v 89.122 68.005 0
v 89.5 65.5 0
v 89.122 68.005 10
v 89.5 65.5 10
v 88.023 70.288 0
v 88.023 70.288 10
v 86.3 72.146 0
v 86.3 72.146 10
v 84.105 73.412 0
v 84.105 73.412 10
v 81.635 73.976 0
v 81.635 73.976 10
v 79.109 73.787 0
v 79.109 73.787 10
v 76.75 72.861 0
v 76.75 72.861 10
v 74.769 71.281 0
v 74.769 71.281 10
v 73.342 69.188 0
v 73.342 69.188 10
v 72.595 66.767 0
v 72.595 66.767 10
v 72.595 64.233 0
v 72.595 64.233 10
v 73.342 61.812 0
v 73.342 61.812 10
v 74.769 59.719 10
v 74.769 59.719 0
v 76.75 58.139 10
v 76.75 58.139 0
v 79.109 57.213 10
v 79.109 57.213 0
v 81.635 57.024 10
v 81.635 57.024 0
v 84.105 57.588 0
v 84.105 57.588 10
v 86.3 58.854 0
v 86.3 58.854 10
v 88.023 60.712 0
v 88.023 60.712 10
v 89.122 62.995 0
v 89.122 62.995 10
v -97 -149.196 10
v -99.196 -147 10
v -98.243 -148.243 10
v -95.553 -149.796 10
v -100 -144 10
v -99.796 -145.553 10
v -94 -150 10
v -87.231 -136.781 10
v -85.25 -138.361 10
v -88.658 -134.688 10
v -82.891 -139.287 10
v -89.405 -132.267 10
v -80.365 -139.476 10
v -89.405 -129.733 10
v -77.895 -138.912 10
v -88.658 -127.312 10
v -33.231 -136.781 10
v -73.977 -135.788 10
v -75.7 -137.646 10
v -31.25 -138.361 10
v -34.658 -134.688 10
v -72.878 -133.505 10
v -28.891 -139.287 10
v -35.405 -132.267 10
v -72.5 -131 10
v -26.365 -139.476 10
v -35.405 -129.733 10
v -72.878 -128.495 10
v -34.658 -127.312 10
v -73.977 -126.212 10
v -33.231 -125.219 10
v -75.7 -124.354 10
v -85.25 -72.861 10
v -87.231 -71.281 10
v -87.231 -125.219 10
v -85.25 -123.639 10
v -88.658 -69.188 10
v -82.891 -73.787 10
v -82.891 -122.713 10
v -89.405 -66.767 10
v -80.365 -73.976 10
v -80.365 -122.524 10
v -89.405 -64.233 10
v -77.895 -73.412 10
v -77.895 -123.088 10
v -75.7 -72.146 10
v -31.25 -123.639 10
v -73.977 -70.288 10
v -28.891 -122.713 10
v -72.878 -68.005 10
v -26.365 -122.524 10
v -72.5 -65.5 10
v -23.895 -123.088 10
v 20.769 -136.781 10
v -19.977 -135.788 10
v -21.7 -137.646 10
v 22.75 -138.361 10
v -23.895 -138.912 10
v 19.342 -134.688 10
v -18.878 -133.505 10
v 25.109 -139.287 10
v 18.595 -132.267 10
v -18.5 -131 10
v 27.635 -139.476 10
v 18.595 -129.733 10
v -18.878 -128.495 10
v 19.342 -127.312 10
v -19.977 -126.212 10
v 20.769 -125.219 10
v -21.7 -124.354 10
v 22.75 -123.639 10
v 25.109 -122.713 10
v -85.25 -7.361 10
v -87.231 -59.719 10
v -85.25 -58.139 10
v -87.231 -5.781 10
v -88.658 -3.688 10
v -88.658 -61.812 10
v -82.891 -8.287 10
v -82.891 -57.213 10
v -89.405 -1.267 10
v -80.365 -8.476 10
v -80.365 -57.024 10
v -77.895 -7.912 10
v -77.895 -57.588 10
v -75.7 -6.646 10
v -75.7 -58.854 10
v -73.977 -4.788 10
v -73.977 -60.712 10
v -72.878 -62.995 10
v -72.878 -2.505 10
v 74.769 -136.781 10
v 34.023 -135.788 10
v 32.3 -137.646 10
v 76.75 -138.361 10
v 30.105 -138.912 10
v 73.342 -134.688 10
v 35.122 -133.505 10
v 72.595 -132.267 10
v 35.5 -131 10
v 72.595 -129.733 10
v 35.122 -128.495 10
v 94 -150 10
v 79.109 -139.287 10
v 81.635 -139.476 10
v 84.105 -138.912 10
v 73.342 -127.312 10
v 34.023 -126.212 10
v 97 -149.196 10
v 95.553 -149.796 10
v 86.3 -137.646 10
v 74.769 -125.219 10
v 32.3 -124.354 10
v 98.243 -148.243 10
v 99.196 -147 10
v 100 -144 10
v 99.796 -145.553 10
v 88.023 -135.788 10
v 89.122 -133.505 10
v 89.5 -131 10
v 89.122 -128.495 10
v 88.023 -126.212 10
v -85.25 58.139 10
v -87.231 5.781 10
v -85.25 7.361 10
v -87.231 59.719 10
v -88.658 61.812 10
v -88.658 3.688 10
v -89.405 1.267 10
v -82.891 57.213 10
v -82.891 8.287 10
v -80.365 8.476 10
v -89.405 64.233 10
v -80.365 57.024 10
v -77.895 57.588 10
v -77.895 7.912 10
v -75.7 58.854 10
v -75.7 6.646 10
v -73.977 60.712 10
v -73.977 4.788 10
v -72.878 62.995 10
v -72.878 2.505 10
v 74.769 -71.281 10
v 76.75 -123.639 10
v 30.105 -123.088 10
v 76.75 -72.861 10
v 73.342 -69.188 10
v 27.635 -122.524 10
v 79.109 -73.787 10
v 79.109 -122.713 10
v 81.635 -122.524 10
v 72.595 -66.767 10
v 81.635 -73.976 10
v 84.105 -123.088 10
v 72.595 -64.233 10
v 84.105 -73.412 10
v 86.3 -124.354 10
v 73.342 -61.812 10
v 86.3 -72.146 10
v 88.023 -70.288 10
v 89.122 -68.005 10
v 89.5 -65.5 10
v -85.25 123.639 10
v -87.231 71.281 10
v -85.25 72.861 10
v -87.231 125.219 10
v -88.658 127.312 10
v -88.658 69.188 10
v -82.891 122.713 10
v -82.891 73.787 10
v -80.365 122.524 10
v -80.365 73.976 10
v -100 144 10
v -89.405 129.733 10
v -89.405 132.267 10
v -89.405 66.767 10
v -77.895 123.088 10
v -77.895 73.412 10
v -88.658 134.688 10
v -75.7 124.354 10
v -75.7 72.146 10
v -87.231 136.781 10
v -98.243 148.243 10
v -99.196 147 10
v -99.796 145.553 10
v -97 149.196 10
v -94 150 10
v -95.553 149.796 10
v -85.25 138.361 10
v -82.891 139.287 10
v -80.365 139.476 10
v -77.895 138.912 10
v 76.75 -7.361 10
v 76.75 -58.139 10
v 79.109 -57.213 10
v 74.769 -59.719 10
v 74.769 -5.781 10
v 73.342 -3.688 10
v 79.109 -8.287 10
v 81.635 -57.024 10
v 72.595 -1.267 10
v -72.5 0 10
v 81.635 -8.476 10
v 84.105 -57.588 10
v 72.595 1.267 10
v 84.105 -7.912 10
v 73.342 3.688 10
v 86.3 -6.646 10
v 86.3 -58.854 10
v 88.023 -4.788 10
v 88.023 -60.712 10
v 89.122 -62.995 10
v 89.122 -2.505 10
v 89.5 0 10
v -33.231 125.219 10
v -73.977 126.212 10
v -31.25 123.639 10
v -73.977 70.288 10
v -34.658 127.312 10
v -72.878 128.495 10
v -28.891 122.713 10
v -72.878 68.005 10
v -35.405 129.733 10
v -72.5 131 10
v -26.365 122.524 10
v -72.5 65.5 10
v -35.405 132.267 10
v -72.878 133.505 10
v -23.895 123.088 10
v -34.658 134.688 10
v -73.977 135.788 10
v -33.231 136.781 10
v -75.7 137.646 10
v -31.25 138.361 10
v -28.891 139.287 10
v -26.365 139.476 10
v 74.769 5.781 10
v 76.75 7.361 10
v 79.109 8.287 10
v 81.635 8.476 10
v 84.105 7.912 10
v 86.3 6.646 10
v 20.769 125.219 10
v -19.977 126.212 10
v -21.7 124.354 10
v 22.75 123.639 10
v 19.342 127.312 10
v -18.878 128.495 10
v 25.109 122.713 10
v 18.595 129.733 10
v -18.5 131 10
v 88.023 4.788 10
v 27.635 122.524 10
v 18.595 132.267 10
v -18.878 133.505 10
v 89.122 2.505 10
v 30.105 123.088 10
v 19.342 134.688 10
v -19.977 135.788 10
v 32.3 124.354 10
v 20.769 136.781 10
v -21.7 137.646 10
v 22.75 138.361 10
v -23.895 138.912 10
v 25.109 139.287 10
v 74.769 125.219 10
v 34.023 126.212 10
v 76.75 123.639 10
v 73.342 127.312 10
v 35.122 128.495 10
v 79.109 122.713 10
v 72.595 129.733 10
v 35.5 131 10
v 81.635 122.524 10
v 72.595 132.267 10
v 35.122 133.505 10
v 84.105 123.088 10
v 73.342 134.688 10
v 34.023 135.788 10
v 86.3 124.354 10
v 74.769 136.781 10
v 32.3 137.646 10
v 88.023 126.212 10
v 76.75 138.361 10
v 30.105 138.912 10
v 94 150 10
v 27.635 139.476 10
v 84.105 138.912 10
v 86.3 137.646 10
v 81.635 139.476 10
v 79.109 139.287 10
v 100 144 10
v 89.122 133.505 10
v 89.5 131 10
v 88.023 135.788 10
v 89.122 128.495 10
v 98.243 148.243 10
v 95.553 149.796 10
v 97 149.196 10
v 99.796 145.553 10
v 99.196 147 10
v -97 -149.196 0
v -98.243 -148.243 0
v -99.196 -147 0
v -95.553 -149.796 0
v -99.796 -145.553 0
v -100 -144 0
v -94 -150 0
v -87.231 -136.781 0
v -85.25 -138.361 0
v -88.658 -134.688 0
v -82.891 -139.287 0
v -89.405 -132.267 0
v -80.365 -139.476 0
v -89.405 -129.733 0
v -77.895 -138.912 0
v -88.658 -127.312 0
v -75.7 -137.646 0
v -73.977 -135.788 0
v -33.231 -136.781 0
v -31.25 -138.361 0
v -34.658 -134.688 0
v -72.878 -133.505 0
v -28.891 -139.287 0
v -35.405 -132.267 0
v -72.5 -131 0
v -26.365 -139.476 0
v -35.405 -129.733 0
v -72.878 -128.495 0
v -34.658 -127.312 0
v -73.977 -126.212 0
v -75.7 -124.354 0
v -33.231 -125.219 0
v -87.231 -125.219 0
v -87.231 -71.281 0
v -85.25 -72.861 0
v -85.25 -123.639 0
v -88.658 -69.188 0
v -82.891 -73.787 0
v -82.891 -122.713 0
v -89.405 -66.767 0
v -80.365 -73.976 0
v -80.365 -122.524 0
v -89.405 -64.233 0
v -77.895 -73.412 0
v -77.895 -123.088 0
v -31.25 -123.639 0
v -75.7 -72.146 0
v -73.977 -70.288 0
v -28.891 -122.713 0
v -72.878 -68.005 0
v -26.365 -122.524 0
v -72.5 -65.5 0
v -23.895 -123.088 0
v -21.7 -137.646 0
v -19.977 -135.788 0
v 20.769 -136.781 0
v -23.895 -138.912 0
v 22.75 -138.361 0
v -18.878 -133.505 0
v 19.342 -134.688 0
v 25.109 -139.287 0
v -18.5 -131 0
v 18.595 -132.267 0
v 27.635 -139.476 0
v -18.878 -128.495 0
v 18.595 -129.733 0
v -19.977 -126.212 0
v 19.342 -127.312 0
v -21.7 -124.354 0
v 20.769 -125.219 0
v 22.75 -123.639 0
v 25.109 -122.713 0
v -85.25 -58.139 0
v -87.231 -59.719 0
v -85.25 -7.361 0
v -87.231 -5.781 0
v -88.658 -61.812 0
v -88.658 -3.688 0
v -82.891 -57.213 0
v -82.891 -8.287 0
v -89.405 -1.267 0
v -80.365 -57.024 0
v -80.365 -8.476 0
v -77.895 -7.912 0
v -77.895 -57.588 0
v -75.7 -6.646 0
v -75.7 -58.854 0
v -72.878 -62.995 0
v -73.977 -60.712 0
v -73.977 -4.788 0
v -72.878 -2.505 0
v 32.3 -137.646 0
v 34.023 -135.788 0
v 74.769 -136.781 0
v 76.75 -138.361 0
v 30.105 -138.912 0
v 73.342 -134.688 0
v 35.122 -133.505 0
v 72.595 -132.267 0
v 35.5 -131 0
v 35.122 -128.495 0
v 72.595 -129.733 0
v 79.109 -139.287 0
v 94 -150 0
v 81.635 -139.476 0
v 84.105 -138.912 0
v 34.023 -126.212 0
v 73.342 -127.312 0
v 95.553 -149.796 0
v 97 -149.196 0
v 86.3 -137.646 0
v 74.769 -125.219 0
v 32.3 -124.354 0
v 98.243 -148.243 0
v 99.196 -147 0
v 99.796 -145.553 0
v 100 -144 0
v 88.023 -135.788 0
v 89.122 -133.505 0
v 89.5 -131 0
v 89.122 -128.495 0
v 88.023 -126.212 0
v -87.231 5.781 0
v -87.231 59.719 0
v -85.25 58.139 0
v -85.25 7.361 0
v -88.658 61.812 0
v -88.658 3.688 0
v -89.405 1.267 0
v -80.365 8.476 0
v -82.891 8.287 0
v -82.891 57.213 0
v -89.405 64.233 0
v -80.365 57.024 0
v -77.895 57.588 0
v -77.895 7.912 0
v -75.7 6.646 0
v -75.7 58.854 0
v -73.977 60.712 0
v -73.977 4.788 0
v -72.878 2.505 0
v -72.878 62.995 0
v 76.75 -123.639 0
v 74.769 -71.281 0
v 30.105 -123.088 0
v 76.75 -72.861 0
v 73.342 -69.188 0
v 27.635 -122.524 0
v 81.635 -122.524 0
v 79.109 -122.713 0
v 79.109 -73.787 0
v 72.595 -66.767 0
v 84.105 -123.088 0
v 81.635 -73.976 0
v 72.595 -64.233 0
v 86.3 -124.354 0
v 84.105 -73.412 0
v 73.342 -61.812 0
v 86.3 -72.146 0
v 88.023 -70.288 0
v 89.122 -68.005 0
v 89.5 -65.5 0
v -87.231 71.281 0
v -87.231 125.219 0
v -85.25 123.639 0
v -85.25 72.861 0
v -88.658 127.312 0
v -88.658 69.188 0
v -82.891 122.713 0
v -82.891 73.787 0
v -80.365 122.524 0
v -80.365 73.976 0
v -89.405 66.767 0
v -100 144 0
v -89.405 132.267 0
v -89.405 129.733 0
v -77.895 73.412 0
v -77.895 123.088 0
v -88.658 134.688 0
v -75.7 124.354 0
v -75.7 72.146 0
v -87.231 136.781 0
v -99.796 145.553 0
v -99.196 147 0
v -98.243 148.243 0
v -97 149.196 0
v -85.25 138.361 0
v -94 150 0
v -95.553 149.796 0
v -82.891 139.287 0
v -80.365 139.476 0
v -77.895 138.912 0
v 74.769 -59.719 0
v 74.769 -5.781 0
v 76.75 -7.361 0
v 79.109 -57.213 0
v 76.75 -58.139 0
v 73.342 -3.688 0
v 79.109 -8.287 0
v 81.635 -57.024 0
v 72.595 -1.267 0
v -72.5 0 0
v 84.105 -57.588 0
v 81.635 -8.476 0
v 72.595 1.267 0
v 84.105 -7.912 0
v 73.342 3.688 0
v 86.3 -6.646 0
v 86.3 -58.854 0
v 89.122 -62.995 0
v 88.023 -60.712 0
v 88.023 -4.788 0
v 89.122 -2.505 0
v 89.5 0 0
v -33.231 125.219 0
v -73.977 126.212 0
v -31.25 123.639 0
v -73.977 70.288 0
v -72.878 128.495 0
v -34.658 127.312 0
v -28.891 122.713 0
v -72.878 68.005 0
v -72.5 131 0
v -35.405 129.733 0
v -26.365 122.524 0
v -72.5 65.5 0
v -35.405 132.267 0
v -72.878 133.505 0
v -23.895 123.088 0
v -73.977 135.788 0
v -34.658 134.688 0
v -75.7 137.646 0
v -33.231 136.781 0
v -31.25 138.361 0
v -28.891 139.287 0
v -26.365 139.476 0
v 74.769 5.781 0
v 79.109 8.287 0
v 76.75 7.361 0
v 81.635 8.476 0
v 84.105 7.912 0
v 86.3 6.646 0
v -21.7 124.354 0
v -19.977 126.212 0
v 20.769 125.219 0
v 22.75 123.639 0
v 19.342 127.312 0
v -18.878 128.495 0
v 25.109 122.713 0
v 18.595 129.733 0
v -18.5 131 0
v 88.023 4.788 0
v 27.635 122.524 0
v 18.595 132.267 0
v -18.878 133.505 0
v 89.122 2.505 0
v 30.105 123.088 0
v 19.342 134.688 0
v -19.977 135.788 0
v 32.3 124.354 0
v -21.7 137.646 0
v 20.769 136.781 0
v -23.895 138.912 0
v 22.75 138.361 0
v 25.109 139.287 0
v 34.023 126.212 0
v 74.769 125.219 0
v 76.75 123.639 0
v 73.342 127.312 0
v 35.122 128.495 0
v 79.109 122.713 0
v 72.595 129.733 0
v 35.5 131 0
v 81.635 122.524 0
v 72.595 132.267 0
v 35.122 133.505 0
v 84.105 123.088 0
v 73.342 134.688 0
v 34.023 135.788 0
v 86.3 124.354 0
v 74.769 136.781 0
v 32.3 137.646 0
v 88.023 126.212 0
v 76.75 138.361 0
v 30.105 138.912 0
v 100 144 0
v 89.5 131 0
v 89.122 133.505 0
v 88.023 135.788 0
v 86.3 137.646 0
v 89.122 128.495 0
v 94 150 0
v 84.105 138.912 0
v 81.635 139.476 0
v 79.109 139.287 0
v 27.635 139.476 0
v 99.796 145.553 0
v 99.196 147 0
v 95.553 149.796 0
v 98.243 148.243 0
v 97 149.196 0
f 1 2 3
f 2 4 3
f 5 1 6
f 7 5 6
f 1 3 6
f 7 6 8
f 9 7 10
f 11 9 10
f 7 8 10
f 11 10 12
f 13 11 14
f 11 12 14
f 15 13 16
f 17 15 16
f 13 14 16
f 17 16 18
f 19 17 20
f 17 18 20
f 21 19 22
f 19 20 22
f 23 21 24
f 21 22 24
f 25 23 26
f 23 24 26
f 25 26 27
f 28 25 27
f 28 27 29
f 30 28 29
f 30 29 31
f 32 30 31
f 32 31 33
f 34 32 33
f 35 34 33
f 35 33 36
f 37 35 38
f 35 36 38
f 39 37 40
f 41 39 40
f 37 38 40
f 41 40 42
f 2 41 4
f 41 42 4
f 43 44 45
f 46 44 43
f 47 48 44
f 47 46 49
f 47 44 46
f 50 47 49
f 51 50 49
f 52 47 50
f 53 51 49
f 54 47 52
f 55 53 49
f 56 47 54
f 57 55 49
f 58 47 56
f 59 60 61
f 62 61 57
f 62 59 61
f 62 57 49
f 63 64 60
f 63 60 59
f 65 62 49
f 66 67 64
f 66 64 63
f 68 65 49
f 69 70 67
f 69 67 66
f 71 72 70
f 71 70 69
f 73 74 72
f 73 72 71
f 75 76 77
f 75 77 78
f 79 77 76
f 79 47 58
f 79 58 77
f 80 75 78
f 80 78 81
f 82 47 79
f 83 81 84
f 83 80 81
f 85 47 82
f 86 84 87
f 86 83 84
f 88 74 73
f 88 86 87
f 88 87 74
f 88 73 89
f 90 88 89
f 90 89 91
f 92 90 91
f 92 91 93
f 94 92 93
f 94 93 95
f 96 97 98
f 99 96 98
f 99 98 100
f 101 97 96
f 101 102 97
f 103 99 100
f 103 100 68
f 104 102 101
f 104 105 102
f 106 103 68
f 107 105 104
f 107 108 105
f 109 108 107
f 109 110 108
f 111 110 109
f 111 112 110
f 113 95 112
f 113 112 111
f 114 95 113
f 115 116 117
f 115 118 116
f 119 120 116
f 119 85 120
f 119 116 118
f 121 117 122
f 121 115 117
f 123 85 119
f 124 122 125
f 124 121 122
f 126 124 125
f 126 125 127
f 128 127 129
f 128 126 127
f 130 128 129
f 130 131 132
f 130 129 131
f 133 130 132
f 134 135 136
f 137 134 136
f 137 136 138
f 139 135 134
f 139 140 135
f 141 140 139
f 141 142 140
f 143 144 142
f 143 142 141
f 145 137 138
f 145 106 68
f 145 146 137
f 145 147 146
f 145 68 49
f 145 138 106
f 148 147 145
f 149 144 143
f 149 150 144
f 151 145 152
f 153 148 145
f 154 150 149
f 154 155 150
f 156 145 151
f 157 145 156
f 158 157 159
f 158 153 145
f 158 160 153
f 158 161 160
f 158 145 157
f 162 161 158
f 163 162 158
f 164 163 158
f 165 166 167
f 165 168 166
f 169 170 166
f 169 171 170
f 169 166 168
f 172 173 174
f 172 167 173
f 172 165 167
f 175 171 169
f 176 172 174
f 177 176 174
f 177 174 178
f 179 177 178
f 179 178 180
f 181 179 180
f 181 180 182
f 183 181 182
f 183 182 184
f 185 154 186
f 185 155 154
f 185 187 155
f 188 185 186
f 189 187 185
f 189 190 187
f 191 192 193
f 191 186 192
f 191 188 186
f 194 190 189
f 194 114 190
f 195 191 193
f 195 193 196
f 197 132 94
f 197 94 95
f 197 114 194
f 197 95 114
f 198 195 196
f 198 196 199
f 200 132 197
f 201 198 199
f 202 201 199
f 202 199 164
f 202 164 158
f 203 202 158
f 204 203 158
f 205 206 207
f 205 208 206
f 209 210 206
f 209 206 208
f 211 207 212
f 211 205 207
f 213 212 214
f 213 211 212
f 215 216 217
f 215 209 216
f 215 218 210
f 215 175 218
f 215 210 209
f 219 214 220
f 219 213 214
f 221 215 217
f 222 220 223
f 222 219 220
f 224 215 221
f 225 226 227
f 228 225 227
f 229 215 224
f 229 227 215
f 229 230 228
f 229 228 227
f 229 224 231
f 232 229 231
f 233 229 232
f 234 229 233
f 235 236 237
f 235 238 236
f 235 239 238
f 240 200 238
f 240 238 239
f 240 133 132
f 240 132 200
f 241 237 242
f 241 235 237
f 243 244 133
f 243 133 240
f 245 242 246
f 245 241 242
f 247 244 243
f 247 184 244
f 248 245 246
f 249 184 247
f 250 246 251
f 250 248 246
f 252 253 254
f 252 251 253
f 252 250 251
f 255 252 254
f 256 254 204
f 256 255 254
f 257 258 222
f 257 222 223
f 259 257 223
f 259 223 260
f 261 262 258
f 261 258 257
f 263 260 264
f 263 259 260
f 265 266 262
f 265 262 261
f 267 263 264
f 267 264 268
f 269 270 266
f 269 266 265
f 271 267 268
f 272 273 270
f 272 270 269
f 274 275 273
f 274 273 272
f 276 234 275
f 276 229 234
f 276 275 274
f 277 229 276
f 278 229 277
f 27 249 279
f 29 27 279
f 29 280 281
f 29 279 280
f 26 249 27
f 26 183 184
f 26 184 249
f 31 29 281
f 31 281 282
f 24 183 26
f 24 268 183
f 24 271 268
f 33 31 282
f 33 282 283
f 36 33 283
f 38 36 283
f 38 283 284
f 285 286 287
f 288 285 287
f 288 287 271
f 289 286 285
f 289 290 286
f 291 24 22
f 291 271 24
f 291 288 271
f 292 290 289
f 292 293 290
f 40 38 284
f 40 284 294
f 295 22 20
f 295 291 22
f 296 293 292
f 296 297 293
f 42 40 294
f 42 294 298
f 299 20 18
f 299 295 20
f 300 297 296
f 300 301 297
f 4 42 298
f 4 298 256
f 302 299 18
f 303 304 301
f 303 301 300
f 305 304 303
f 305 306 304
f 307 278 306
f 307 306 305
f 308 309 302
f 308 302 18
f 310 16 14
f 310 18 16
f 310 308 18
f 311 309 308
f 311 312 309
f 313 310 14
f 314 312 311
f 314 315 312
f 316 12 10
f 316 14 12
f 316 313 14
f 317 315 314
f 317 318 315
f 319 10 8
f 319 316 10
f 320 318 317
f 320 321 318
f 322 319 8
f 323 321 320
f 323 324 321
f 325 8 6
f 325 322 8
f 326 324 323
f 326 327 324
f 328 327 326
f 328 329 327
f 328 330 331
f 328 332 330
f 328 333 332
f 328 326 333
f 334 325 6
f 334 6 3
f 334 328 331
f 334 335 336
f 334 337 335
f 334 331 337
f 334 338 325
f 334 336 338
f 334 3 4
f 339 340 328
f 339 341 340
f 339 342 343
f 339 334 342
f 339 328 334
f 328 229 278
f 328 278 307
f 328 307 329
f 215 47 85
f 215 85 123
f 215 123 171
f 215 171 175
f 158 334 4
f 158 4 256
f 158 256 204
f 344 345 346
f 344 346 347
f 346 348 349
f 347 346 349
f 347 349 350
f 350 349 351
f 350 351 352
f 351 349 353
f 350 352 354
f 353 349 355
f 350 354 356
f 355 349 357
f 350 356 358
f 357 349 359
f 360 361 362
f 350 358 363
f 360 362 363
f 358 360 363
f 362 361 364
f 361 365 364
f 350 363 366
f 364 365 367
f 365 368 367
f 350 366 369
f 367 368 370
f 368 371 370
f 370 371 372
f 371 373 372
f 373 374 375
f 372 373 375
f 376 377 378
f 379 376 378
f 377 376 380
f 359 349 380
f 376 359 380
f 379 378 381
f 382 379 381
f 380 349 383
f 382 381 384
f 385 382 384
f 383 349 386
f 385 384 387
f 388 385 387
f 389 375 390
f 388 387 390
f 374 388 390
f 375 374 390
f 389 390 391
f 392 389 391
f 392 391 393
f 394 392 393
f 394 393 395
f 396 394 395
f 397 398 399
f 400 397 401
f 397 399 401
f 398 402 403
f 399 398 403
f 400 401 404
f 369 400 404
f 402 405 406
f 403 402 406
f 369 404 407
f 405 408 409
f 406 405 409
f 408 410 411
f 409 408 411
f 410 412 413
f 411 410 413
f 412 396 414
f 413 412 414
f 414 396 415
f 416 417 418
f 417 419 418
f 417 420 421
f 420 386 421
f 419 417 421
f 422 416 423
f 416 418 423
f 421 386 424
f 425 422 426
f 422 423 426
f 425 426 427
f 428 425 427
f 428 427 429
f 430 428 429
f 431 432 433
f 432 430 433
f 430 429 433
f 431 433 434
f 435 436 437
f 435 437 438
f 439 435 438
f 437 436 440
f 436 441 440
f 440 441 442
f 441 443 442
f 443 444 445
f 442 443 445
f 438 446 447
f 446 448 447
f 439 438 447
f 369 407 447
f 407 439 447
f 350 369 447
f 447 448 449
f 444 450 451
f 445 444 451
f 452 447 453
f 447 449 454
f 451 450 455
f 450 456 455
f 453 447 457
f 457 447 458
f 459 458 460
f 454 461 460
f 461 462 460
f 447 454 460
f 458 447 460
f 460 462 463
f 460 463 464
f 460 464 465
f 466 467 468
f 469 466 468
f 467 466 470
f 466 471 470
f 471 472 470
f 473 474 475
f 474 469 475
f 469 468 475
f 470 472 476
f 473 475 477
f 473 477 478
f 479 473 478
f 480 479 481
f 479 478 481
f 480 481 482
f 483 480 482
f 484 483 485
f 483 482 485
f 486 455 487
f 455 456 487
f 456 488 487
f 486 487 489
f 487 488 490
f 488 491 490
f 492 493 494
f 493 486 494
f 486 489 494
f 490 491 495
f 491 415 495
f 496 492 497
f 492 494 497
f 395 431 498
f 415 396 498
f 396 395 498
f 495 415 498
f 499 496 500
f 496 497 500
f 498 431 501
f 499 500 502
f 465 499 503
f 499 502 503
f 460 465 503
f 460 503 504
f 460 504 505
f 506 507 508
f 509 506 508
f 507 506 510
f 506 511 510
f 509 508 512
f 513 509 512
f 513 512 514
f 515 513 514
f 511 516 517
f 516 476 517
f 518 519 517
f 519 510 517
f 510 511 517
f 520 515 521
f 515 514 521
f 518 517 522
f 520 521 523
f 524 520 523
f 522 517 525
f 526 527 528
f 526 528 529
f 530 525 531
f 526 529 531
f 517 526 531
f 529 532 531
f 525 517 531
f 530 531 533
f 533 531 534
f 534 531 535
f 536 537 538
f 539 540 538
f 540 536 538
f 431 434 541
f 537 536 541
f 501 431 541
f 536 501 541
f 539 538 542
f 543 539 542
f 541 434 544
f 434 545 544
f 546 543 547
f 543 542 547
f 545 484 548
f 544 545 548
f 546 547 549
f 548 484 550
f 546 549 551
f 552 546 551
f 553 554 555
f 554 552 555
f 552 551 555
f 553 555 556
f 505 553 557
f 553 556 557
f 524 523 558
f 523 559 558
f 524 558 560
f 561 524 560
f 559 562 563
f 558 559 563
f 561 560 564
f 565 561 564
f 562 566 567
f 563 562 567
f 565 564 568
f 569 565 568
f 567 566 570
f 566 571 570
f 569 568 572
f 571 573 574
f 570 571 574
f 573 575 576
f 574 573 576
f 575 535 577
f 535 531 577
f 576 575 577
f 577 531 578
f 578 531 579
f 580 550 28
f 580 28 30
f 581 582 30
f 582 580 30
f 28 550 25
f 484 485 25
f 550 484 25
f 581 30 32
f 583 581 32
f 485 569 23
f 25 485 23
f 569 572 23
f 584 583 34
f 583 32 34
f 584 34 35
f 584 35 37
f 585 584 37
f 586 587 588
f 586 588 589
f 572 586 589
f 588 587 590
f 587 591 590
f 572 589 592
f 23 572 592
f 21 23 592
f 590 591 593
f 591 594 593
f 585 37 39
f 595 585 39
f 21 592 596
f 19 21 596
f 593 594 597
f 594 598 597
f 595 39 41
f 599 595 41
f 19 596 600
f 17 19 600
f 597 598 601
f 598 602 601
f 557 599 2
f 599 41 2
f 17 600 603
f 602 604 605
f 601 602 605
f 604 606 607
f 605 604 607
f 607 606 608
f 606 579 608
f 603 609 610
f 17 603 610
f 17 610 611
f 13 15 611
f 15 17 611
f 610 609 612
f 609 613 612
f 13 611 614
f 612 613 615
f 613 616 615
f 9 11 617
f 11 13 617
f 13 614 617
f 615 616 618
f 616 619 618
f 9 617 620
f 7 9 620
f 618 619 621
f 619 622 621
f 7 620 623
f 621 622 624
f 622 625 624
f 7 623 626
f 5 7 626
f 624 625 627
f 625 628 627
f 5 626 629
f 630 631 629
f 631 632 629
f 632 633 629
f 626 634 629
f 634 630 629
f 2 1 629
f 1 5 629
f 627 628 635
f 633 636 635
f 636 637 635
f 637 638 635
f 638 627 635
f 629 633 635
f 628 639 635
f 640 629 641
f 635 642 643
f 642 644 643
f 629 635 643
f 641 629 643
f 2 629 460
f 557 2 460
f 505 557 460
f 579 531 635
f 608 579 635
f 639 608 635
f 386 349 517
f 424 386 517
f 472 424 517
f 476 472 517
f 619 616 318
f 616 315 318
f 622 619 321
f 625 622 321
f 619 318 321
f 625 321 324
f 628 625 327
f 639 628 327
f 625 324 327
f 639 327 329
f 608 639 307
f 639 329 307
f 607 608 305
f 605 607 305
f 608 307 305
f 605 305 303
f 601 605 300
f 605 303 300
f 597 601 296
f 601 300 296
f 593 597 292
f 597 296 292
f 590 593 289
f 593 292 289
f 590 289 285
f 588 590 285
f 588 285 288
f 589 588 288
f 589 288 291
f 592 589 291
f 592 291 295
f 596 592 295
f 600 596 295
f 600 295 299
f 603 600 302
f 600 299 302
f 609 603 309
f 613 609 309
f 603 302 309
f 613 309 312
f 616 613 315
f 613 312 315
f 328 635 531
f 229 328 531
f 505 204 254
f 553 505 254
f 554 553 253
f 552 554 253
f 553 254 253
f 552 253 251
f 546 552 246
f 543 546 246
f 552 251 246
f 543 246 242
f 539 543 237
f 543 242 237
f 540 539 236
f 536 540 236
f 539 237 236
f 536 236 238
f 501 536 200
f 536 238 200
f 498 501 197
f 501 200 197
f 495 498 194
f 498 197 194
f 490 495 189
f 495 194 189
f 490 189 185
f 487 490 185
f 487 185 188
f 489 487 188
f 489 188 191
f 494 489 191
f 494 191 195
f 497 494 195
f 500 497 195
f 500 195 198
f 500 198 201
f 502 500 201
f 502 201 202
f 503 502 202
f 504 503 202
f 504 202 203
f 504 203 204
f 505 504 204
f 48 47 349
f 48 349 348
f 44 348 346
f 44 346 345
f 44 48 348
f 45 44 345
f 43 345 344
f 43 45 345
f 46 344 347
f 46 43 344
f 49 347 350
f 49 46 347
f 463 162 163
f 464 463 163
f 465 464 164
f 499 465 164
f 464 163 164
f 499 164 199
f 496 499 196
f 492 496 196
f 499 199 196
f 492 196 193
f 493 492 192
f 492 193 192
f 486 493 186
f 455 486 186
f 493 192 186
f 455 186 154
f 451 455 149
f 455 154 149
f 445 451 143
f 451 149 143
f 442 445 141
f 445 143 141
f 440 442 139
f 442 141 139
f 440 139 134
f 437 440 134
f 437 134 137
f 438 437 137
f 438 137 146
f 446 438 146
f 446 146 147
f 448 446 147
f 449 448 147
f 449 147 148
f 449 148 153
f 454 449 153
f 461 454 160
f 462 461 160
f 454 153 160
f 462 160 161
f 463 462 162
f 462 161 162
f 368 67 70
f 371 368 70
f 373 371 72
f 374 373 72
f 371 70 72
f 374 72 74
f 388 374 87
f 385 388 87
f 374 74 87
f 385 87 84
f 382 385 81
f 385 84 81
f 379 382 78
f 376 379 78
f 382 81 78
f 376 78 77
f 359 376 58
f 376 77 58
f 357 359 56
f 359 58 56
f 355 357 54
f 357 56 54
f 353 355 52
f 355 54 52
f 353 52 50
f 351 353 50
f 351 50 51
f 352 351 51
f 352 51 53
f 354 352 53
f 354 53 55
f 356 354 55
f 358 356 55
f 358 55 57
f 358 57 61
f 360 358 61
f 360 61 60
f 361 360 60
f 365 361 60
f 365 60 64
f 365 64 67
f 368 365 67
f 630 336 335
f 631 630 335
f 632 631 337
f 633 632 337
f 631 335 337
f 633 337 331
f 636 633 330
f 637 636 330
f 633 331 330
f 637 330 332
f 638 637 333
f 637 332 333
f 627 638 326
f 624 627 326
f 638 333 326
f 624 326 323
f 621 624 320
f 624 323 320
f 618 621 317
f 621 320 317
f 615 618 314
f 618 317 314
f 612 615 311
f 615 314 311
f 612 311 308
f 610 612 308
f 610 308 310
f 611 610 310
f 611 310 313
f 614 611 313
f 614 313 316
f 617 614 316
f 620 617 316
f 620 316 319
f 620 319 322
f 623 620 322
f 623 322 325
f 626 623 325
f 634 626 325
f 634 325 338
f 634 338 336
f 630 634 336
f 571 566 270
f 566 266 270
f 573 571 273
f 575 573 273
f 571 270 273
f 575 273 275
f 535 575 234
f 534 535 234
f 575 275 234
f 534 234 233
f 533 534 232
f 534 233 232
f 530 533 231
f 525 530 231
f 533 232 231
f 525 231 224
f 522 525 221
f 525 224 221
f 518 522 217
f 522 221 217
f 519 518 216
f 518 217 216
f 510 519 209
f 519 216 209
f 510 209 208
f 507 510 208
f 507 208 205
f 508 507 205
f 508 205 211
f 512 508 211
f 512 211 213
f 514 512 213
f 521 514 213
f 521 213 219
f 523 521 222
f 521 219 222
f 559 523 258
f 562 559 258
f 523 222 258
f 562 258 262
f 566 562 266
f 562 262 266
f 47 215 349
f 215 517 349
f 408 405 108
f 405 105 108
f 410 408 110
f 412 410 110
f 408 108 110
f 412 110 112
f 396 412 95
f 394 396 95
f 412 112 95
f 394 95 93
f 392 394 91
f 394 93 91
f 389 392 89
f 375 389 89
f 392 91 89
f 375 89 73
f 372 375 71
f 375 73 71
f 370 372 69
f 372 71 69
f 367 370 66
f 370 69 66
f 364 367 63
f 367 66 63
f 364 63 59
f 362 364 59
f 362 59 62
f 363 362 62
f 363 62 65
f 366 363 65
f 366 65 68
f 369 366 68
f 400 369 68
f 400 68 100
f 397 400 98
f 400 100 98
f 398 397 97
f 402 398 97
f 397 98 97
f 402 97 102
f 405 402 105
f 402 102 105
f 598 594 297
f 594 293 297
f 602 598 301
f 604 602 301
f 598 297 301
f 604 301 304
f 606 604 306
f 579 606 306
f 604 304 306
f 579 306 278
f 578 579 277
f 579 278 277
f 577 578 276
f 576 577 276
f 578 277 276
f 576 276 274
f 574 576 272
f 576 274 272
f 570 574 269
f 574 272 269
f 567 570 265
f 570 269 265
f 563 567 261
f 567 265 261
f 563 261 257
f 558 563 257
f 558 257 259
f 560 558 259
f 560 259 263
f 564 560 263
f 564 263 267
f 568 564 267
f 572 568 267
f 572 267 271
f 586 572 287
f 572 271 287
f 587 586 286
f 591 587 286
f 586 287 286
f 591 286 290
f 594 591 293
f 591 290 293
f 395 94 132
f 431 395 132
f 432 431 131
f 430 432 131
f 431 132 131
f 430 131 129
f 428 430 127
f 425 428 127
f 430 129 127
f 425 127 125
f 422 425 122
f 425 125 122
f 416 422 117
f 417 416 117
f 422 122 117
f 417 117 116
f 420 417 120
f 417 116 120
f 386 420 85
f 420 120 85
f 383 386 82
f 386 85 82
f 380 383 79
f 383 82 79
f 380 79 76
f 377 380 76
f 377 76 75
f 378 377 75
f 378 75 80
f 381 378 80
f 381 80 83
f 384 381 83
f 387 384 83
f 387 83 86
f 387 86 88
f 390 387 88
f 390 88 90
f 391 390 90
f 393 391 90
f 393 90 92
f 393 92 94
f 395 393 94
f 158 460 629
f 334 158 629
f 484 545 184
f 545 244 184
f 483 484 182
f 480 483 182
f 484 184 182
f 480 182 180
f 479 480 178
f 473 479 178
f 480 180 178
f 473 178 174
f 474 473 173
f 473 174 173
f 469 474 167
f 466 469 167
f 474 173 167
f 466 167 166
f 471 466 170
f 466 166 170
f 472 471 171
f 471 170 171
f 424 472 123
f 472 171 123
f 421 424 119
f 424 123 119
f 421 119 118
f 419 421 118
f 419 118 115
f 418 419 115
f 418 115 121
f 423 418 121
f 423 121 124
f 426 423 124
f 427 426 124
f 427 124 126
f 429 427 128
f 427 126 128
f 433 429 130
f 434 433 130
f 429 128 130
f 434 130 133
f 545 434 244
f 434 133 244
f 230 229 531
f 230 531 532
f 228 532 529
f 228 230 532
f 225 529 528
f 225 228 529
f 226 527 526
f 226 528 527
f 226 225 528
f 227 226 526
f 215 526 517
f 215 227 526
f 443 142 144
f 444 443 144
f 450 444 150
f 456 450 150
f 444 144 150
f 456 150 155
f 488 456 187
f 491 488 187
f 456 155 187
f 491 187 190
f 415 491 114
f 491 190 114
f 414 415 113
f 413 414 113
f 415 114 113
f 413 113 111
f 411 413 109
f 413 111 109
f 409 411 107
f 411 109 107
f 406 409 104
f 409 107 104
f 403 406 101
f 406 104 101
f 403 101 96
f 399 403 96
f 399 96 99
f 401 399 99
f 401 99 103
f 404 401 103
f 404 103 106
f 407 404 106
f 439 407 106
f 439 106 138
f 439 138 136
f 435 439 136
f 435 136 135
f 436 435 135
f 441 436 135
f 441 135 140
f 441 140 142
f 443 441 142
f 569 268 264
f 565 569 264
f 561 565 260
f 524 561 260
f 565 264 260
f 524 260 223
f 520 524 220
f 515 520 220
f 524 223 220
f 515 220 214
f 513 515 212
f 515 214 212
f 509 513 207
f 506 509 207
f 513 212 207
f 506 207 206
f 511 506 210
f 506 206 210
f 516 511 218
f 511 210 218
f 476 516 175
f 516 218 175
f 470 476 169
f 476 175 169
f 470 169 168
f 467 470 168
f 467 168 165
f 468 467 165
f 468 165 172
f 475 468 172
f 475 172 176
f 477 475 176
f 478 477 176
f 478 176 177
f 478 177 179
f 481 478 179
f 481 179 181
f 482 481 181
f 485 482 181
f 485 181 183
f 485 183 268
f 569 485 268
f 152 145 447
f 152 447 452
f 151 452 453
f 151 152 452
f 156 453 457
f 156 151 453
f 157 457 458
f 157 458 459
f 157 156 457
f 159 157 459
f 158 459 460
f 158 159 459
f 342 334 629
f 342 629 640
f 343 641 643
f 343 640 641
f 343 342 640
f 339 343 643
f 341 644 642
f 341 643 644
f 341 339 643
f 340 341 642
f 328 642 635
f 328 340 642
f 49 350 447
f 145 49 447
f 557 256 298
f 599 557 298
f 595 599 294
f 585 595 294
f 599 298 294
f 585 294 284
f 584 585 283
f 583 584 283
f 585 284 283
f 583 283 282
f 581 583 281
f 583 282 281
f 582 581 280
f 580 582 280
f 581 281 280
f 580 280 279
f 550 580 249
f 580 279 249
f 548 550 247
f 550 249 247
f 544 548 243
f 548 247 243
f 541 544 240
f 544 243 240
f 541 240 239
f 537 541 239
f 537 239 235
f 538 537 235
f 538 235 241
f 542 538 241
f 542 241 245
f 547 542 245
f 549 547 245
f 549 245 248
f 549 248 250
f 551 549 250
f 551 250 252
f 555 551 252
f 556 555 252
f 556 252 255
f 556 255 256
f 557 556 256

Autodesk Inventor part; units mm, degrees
ref_plane "YZ Plane" through (0, 0, 0) normal (1, 0, 0) x (0, 1, 0)
ref_plane "XZ Plane" through (0, 0, 0) normal (0, 1, 0) x (-1, 0, 0)
ref_plane "XY Plane" through (0, 0, 0) normal (0, 0, 1) x (1, 0, 0)
sketch "Sketch2" plane through (0, 0, 0) normal (0, 0, 1) x (1, 0, 0)
  line L0 (-50, -100) -> (50, -100)
  line L1 (50, -100) -> (50, 100)
  line L2 (50, 100) -> (-50, 100)
  line L3 (-50, 100) -> (-50, -100)
  line L4 (-50, -100) -> (50, 100) construction
  line L5 (50, -100) -> (-50, 100) construction
  line L6 (-100, -150) -> (100, -150)
  line L7 (100, -150) -> (100, 150)
  line L8 (100, 150) -> (-100, 150)
  line L9 (-100, 150) -> (-100, -150)
  point P0 (0, 0)
  dimension "d29" = 100
  dimension "d30" = 200
  dimension "d31" = 50
extrude "Plate2" add sketch "Sketch2" along normal blind 10 contours L3 L2 L1 L0 | L9 L8 L7 L6
sketch "Sketch5" plane through (0, 0, 10) normal (0, 0, 1) x (1, 0, 0)
  line L0 (100, -150) -> (-100, -150) construction
  line L1 (100, 150) -> (100, -150) construction
  line L2 (-100, 150) -> (100, 150) construction
  line L3 (-100, -150) -> (-100, 150) construction
  line L4 (-81, 131) -> (81, 131) construction
  line L5 (81, 131) -> (81, -131) construction
  line L6 (81, -131) -> (-81, -131) construction
  line L7 (-81, -131) -> (-81, 131) construction
  circle A0 centre (-81, -131) radius 8.5
  circle A1 centre (-81, 131) radius 8.5
  circle A2 centre (-81, 0) radius 8.5
  circle A3 centre (-81, -65.5) radius 8.5
  circle A4 centre (-81, 65.5) radius 8.5
  line L8 (-50, 0) -> (50, 0) construction
  circle A5 centre (-27, -131) radius 8.5
  circle A6 centre (-27, -65.5) radius 8.5
  circle A7 centre (-27, 0) radius 8.5
  circle A8 centre (-27, 65.5) radius 8.5
  circle A9 centre (-27, 131) radius 8.5
  circle A10 centre (27, -131) radius 8.5
  circle A11 centre (27, -65.5) radius 8.5
  circle A12 centre (27, 0) radius 8.5
  circle A13 centre (27, 65.5) radius 8.5
  circle A14 centre (27, 131) radius 8.5
  circle A15 centre (81, -131) radius 8.5
  circle A16 centre (81, -65.5) radius 8.5
  circle A17 centre (81, 0) radius 8.5
  circle A18 centre (81, 65.5) radius 8.5
  circle A19 centre (81, 131) radius 8.5
  point P0 (0, 0)
  point P1 (0, -131)
  dimension "d33" = 17
  dimension "d34" = 19
  dimension "d35" = 65.5
  dimension "d36" = 65.5
  dimension "d39" = 54
extrude "Cut3" cut sketch "Sketch5" against normal blind 10 contours A0 | A1 | A2 | A3 | A4 | A5 | A9 | A10 | A14 | A15 | A16 | A17 | A18 | A19
fillet "Corner Round1" radius 6 4 edges at (-100, -150, 5) (-100, 150, 5) (100, 150, 5) (100, -150, 5)
equation "\"d35\" = d36"
equation "\"d44\" = Thickness"
equation "\"d14\" = Thickness"
equation "\"BendReliefDepth\" = 0.5 * Thickness"
equation "\"TransitionRadius\" = BendRadius"
equation "\"JacobiRadiusSize\" = BendRadius"
equation "\"Thickness\" = 10"
equation "\"BendRadius\" = 6"
properties part number "PNS 1607 charging flange rect_1200" material "Steel"
